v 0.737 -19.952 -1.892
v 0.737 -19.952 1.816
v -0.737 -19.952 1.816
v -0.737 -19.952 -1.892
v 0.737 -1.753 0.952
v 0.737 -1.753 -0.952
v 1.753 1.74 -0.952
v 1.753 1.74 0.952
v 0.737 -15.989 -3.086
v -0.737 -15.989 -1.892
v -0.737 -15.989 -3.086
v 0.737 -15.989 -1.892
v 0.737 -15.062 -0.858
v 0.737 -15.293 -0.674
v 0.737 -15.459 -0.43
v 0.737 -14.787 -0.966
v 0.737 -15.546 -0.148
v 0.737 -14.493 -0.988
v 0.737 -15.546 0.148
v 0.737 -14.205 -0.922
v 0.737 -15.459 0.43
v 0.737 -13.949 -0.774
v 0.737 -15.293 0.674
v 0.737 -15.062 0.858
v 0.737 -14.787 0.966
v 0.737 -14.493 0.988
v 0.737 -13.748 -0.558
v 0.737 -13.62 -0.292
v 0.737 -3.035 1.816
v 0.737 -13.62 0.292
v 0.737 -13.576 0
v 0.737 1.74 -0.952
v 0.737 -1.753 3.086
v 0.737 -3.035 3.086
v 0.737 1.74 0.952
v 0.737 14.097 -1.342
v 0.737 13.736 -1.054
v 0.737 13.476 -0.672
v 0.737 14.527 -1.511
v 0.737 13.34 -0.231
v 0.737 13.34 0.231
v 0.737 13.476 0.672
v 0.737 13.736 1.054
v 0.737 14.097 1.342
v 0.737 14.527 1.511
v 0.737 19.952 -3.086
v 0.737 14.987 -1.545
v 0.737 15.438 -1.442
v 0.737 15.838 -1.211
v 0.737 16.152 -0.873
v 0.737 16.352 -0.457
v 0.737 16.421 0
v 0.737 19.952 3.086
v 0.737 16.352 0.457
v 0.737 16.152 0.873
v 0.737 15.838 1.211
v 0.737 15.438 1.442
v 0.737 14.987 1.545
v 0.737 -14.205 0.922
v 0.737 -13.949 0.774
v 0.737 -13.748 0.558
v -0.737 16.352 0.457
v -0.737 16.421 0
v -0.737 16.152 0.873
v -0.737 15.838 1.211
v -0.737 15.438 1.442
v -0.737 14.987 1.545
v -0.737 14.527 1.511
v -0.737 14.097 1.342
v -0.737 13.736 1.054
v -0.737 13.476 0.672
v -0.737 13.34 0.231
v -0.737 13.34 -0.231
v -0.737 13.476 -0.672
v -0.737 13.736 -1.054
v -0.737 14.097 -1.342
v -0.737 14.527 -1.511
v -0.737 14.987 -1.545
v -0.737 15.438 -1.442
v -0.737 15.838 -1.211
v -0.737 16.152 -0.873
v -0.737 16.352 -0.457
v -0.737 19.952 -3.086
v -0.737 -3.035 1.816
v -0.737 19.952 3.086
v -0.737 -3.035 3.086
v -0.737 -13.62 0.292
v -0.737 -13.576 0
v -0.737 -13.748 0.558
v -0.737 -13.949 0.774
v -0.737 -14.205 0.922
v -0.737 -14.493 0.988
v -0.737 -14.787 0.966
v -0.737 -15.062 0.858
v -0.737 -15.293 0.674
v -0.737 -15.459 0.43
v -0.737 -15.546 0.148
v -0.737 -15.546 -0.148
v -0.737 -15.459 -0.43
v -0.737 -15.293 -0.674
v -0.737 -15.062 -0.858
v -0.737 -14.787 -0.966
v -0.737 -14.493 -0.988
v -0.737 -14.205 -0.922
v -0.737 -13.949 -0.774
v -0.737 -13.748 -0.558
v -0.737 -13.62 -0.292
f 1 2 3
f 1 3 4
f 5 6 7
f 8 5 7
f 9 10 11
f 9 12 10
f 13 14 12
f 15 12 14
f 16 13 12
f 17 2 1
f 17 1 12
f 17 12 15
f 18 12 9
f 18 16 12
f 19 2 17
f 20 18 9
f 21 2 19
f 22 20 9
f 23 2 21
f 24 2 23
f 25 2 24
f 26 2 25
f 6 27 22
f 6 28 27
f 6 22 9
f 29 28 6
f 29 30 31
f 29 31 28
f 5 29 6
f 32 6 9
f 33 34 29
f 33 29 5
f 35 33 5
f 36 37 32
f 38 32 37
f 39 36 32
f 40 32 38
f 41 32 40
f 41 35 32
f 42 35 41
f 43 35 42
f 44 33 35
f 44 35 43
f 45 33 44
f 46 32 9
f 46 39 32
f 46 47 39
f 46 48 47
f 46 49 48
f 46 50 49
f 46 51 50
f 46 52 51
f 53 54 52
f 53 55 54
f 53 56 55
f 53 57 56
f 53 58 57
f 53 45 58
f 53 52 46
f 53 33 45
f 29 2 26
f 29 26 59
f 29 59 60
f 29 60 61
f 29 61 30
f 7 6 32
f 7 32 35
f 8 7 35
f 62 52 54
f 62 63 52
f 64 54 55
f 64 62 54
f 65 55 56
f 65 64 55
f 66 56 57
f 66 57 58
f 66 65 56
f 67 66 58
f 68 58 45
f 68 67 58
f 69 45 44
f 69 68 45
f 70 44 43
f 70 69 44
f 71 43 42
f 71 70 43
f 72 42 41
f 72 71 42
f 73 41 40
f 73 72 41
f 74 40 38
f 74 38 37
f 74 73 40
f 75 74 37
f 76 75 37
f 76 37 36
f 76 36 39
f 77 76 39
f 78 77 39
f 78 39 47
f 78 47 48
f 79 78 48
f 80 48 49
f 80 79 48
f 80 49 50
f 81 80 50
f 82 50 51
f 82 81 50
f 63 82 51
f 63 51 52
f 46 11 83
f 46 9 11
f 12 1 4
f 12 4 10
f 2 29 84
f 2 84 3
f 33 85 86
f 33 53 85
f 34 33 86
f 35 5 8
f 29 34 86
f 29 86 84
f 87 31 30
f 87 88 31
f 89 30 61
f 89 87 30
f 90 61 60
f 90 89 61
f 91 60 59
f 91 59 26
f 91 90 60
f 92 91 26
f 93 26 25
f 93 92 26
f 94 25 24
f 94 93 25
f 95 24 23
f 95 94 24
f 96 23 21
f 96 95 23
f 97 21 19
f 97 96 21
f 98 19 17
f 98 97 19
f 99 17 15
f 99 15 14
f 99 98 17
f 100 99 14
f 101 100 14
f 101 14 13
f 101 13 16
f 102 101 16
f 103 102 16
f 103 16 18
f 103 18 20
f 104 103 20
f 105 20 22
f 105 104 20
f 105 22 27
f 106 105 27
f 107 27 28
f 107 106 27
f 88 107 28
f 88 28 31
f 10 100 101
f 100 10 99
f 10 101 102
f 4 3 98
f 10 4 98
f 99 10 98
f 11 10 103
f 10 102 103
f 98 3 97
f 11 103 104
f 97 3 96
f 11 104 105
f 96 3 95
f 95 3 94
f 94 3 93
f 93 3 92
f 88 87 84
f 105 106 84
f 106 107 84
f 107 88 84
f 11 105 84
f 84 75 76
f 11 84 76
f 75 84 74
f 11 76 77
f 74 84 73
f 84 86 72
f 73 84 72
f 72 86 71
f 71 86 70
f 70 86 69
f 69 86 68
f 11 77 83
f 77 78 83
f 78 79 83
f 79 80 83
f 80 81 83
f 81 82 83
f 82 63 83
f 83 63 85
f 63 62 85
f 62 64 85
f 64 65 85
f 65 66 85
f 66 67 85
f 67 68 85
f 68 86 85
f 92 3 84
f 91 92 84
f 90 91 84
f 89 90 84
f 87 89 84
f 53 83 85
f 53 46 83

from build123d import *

# Parameters (mm, degrees)
F0_R     = 0.9906
F0_R_2   = 1.5494
F1_DEPTH = 0.7366
F2_W     = 3.4925
F2_H     = 1.905
F3_DEPTH = 1.016
F5_DEPTH = 25.4


with BuildPart() as f1:
    # F0 (on Right) → F1 (new body, symmetric)
    with BuildSketch(Plane.YZ):
        Polygon((19.9517, 3.0861), (-3.0353, 3.0861), (-3.0353, 1.8161), (-19.9517, 1.8161), (-19.9517, -1.8923), (-15.9893, -1.8923), (-15.9893, -3.0861), (19.9517, -3.0861), align=None)
        with Locations((-14.5669, 0)):
            Circle(F0_R, mode=Mode.SUBTRACT)
        with Locations((14.8717, 0)):
            Circle(F0_R_2, mode=Mode.SUBTRACT)
    extrude(amount=F1_DEPTH, both=True)

    # F2 (on face) → F3 (join)
    with BuildSketch(Plane.YZ.offset(0.7366)):
        with Locations((-0.00635, 0)):
            Rectangle(F2_W, F2_H)
    extrude(amount=F3_DEPTH)

    # F4 (on face) → F5 (cut)
    with BuildSketch(Plane(origin=(0, 0, -0.9525), x_dir=(1, 0, 0), z_dir=(0, 0, -1))):
        Polygon((1.7526, 1.7526), (0.7366, 1.7526), (1.7526, -1.7399), align=None)
    extrude(amount=-F5_DEPTH, mode=Mode.SUBTRACT)


solid = f1.part
